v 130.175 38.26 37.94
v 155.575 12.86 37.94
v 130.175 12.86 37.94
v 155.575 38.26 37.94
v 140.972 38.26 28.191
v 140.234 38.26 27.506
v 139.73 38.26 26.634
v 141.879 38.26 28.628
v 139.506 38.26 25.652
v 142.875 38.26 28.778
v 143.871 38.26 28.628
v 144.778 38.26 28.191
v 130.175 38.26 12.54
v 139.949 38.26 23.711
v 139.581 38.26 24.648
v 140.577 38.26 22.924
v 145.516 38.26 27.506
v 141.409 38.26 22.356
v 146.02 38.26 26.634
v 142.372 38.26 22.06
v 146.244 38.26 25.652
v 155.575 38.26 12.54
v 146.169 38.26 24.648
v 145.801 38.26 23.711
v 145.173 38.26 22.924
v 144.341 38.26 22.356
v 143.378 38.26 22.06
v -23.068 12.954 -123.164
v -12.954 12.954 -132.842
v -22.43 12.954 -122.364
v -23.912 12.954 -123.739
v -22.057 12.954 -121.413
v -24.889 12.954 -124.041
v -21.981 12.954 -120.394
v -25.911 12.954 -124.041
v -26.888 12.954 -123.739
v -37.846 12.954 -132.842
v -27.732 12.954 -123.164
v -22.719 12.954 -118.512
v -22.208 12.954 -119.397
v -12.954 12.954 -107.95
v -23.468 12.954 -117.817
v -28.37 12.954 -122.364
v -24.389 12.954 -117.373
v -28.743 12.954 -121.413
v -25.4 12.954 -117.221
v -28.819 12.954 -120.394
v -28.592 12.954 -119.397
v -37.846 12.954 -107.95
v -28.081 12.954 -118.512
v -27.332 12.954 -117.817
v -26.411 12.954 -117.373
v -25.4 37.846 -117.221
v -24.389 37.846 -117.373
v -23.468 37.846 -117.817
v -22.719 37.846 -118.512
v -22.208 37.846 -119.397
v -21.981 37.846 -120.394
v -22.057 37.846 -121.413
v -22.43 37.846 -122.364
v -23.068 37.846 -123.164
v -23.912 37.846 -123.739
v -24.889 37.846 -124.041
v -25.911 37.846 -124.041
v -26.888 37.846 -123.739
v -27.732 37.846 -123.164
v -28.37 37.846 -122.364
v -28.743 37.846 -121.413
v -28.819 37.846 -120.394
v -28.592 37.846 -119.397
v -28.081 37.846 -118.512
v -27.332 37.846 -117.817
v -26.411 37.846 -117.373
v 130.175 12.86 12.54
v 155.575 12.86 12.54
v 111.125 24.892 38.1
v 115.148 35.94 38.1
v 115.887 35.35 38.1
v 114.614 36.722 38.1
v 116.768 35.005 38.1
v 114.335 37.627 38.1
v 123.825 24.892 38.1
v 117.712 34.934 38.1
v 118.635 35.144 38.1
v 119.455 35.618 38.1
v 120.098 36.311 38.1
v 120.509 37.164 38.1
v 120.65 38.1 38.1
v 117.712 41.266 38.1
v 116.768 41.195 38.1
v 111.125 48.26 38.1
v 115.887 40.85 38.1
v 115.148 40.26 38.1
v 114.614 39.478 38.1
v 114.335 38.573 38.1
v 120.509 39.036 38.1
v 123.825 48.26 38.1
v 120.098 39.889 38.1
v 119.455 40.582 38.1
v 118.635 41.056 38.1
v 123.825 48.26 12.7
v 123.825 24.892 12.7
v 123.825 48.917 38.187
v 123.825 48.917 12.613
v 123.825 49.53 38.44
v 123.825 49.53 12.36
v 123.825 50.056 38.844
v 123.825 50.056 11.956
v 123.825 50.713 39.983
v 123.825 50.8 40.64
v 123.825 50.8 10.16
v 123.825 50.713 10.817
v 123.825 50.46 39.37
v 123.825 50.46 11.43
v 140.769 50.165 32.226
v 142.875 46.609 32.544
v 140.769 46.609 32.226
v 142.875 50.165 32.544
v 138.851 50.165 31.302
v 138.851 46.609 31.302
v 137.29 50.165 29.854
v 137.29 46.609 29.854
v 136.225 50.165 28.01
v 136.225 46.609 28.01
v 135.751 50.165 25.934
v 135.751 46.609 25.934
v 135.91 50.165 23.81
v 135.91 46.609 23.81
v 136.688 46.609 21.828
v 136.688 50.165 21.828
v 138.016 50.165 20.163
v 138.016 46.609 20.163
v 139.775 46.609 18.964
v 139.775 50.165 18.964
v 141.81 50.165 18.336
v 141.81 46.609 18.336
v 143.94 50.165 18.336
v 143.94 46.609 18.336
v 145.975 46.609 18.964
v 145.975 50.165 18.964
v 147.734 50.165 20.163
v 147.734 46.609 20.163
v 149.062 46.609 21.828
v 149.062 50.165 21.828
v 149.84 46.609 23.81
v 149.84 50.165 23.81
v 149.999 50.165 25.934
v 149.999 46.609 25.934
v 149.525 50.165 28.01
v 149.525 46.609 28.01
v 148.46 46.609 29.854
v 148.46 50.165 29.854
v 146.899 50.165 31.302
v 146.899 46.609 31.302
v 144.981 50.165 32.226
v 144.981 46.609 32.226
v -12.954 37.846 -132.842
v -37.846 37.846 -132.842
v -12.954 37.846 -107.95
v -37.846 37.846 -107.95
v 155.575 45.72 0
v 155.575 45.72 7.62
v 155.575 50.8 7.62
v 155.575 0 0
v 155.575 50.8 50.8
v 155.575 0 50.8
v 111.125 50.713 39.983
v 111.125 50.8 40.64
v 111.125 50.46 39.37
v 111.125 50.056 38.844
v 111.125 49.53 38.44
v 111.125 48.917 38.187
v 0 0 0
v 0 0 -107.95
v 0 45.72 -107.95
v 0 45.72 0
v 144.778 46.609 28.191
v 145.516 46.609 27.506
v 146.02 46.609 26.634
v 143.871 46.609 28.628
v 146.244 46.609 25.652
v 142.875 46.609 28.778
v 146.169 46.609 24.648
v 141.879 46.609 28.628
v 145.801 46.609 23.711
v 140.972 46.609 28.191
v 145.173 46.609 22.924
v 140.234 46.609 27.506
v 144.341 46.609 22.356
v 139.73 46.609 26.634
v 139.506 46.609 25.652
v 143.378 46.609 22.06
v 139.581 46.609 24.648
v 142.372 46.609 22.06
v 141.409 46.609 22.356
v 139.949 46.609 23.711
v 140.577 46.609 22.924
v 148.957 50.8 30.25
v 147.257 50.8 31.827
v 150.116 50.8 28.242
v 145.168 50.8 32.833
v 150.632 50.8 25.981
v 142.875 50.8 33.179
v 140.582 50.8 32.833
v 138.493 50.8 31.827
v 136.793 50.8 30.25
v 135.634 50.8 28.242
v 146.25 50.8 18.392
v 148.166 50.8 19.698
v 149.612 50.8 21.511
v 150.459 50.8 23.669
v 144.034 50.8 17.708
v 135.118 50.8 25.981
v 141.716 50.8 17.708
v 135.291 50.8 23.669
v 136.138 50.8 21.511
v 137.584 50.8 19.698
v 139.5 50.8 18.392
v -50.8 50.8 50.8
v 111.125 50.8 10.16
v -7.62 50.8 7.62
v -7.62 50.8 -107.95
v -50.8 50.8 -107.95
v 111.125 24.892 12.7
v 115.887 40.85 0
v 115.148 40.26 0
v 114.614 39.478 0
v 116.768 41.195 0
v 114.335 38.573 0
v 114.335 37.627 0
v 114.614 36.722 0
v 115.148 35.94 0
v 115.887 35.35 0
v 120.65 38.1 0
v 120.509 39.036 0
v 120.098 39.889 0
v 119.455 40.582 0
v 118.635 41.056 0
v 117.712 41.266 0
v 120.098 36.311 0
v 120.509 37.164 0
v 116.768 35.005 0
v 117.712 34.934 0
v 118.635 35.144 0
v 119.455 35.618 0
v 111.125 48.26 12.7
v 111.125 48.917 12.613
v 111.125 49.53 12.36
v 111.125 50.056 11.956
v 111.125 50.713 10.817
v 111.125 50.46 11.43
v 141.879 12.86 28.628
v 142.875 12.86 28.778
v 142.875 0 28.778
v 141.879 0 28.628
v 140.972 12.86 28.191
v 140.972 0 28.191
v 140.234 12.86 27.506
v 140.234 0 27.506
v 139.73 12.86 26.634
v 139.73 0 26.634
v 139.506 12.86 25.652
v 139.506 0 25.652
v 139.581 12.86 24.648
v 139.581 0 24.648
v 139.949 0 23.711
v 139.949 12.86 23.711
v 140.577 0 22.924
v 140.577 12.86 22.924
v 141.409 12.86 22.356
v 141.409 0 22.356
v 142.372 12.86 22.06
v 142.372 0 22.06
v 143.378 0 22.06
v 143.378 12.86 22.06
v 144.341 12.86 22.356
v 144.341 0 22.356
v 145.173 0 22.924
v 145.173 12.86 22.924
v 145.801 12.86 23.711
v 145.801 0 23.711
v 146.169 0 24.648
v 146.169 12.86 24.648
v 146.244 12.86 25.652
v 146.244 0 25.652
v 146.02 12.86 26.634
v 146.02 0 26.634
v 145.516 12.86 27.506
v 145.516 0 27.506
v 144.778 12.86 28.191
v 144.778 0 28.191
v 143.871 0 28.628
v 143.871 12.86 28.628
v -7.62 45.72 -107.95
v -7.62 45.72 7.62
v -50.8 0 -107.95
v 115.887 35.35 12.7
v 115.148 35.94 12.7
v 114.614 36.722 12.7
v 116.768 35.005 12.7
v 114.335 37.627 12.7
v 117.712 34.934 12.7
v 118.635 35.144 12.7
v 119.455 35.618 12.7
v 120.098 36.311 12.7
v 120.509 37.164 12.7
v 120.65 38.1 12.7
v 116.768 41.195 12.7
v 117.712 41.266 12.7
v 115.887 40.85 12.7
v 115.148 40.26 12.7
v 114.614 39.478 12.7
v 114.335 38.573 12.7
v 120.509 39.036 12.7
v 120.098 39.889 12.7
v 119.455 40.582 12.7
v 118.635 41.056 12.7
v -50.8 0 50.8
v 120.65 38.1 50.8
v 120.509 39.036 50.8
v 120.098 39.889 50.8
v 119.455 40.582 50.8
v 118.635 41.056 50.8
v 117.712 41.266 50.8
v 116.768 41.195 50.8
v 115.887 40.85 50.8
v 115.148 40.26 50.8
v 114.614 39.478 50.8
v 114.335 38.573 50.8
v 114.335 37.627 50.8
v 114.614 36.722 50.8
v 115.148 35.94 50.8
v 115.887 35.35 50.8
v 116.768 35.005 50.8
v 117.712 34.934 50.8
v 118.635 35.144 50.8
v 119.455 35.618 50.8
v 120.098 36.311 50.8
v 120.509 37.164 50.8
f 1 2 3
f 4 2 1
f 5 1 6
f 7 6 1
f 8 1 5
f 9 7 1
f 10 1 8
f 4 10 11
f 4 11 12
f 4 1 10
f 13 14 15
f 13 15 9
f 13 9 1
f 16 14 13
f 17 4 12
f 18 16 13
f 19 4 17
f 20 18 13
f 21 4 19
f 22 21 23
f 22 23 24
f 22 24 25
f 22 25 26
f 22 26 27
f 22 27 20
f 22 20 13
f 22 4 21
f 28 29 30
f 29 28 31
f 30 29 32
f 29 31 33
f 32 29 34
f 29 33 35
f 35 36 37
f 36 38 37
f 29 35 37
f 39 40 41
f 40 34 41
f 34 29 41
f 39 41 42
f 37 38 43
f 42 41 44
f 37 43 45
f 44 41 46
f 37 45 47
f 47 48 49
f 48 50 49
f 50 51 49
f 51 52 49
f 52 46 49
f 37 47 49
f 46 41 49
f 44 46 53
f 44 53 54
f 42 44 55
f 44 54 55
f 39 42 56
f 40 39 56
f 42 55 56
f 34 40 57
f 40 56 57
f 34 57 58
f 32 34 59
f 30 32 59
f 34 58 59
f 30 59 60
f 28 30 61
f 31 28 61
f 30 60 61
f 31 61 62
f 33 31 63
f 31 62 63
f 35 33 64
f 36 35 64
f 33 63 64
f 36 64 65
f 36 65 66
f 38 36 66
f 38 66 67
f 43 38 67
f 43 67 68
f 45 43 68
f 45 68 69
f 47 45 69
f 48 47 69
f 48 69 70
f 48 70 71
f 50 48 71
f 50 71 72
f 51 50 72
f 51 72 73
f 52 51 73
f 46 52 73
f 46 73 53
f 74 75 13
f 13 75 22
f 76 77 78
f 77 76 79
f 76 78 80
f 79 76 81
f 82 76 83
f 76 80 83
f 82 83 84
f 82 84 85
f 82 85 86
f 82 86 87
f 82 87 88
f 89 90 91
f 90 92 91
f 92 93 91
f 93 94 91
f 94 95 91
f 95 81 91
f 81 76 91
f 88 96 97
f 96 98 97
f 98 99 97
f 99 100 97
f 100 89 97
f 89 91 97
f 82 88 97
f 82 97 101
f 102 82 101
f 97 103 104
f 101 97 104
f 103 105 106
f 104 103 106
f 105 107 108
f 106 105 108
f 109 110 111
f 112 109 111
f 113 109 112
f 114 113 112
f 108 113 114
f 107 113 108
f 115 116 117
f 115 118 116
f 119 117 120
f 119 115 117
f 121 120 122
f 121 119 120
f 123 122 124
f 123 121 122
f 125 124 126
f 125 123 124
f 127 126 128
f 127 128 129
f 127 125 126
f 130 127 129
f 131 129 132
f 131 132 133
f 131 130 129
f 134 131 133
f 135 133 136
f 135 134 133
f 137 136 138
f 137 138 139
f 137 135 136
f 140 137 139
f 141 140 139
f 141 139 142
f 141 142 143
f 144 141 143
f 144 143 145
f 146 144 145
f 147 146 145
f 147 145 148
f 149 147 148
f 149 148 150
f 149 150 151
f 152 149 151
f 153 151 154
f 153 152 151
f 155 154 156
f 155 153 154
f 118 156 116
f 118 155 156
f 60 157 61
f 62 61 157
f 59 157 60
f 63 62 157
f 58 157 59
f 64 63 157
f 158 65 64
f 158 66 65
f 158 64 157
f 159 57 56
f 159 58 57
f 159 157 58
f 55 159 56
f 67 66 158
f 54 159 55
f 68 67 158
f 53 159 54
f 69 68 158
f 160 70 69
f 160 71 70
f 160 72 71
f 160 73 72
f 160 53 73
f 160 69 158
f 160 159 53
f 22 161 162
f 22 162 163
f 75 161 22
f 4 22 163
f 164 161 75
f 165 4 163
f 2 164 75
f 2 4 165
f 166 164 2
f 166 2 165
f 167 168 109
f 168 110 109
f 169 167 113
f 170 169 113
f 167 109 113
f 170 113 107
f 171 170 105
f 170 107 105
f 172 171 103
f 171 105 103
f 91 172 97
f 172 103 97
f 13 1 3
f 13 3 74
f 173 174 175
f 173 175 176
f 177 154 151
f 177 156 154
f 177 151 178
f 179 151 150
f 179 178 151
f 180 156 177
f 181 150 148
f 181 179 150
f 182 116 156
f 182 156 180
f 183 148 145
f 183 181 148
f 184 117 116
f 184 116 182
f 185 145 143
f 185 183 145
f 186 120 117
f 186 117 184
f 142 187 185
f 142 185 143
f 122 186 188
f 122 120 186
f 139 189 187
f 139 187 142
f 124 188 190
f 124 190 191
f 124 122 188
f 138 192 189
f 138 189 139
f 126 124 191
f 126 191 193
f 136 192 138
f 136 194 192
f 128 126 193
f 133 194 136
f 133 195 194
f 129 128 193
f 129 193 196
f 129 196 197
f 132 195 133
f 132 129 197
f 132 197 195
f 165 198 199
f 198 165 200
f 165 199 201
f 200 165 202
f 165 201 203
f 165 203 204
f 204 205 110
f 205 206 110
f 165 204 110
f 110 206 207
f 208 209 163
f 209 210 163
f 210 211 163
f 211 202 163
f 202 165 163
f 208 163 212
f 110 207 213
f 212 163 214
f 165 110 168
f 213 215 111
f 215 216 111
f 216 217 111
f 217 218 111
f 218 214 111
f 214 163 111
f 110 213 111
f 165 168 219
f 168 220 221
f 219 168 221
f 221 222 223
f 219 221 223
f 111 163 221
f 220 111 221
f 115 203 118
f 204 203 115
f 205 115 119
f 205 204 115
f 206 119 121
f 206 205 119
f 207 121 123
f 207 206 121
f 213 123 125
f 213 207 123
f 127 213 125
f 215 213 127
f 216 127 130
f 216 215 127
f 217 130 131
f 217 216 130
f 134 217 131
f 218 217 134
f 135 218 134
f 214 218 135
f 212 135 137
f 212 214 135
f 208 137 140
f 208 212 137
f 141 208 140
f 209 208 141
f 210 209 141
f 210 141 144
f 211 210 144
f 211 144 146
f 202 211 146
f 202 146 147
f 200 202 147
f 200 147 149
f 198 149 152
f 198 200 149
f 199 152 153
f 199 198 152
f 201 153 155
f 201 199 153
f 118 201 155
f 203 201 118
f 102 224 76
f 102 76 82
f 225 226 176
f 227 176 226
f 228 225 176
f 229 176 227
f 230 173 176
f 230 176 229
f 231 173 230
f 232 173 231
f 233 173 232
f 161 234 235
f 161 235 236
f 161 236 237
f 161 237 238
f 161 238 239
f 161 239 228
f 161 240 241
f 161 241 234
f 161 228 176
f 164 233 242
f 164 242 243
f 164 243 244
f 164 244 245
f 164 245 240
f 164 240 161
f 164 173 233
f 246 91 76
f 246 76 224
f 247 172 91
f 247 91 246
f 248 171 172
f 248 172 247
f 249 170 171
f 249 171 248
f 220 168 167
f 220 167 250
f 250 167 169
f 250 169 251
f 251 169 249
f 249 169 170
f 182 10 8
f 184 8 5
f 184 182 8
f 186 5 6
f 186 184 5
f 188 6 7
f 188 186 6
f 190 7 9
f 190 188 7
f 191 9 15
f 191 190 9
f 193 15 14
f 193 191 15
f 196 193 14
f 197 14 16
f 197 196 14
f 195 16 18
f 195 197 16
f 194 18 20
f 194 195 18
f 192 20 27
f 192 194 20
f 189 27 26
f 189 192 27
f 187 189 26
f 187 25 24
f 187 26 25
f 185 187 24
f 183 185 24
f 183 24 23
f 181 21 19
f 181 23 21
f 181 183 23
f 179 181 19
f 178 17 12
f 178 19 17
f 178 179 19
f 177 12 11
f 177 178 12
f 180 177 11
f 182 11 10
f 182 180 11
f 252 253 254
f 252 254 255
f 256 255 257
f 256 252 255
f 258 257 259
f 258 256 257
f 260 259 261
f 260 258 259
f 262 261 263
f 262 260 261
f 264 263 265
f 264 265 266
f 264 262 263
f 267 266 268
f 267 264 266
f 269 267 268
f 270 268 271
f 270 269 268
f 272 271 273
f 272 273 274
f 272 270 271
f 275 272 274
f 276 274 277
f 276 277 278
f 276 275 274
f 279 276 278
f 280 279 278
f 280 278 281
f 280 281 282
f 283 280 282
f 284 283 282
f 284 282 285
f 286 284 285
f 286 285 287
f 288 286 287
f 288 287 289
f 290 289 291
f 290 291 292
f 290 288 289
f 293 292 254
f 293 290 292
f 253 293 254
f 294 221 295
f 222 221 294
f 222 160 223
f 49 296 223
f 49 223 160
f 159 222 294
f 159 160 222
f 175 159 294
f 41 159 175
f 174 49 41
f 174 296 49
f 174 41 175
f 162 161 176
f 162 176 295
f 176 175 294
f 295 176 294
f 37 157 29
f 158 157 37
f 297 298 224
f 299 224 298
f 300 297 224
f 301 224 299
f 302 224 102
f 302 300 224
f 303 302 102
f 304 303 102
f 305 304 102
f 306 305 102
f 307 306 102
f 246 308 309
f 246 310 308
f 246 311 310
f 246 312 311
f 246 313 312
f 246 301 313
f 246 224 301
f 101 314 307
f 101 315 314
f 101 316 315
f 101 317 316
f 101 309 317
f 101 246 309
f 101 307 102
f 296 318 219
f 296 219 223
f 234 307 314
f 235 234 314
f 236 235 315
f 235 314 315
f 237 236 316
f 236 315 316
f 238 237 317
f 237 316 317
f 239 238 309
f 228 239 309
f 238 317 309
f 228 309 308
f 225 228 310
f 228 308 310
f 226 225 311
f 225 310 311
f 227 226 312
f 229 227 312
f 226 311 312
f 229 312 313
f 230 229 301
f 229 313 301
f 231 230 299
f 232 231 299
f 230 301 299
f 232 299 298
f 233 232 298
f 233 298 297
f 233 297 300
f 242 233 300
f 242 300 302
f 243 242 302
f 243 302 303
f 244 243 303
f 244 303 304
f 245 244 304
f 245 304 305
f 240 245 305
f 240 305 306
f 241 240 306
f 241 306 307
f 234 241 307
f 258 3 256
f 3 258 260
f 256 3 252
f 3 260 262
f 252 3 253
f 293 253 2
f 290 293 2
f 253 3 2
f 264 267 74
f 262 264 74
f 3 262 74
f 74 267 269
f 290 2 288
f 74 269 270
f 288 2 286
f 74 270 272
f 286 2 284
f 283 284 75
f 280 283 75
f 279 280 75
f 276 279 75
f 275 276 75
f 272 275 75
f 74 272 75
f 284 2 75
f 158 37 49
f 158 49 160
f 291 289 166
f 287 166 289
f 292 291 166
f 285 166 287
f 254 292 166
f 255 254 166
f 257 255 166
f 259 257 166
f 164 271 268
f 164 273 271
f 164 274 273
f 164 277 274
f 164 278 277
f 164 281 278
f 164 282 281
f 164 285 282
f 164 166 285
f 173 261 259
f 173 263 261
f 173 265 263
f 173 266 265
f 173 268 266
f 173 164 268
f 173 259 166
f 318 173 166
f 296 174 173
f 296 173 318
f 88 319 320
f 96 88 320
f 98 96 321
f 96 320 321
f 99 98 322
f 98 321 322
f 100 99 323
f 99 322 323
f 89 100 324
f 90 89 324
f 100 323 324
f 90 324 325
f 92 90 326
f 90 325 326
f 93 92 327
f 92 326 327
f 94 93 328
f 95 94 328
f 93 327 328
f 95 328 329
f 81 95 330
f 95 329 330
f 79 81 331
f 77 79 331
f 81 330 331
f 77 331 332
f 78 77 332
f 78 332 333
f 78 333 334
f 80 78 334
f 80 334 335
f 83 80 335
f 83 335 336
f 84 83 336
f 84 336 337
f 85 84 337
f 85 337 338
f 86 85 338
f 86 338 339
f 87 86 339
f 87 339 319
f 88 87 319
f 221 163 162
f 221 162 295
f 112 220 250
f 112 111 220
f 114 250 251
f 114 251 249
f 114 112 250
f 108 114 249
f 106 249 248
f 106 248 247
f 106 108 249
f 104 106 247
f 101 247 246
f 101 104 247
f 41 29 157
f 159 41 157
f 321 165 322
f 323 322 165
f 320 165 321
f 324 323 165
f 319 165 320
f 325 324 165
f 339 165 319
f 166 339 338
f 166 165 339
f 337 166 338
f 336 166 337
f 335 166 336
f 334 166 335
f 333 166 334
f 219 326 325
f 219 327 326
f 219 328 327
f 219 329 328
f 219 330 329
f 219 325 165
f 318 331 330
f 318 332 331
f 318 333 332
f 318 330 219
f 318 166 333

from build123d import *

# Parameters (mm, degrees)
BOSS_EXTRUDE1_DEPTH = 50.8
SKETCH3_W           = 25.4
SKETCH3_H           = 25.4
CUT_EXTRUDE1_DEPTH  = 25.4
SKETCH8_W           = 24.892
SKETCH8_H           = 24.892
BOSS_EXTRUDE2_DEPTH = 24.892
SKETCH12_R          = 3.429
CUT_EXTRUDE2_DEPTH  = 25.4
SKETCH13_W          = 12.7
SKETCH13_H          = 25.4
CUT_EXTRUDE3_DEPTH  = 25.908
FILLET1_R           = 2.54
CUT_EXTRUDE6_DEPTH  = 5.08
SKETCH15_R          = 3.175
CUT_EXTRUDE7_DEPTH  = 246.984968624


with BuildPart() as part:
    # Sketch2 → Boss-Extrude1 (new body)
    with BuildSketch(Plane(origin=(0, 0, 0), x_dir=(1, 0, 0), z_dir=(0, 1, 0))):
        Polygon((-50.8, 107.95), (0, 107.95), (0, 0), (155.575, 0), (155.575, -50.8), (-50.8, -50.8), align=None)
    extrude(amount=BOSS_EXTRUDE1_DEPTH)

    # Sketch3 → Cut-Extrude1 (cut)
    with BuildSketch(Plane(origin=(155.575, 0, 0), x_dir=(0, 0, -1), z_dir=(1, 0, 0))):
        with Locations((-25.239912, 25.560088)):
            Rectangle(SKETCH3_W, SKETCH3_H)
    extrude(amount=-CUT_EXTRUDE1_DEPTH, mode=Mode.SUBTRACT)

    # Sketch7 → CBORE for 1/4 Binding Head Machine Screw1 (revolve, cut)
    with BuildSketch(Plane(origin=(142.875, 50.8, 25.4), x_dir=(0, 0, 1), z_dir=(1, 0, 0))):
        Polygon((0, 0), (0, 50.8), (3.3782, 50.8), (3.3782, 4.191), (7.14375, 4.191), (7.14375, 0.635), (7.77875, 0), align=None)
    revolve(axis=Axis((142.875, 57.15, 25.4), (0, -1, 0)), mode=Mode.SUBTRACT)

    # Sketch8 → Boss-Extrude2 (add)
    with BuildSketch(Plane(origin=(0, 0, -107.95), x_dir=(-1, 0, 0), z_dir=(0, 0, -1))):
        with Locations((25.4, 25.4)):
            Rectangle(SKETCH8_W, SKETCH8_H)
    extrude(amount=BOSS_EXTRUDE2_DEPTH)

    # Sketch12 → Cut-Extrude2 (cut)
    with BuildSketch(Plane(origin=(0, 37.846, 0), x_dir=(1, 0, 0), z_dir=(0, 1, 0))):
        with Locations(Location((-25.4, 120.65, 0), (0, 0, 270))):
            Circle(SKETCH12_R)
    extrude(amount=-CUT_EXTRUDE2_DEPTH, mode=Mode.SUBTRACT)

    # Sketch13 → Cut-Extrude3 (cut)
    with BuildSketch(Plane(origin=(0, 50.8, 0), x_dir=(1, 0, 0), z_dir=(0, 1, 0))):
        with Locations((117.475, -25.4)):
            Rectangle(SKETCH13_W, SKETCH13_H)
    extrude(amount=-CUT_EXTRUDE3_DEPTH, mode=Mode.SUBTRACT)

    # Fillet1
    fillet1_edges = [part.edges().sort_by_distance(p)[0] for p in [
        (117.475, 50.8, 12.7),
        (117.475, 50.8, 38.1),
    ]]
    fillet(fillet1_edges, radius=FILLET1_R)

    # Sketch17 → Cut-Extrude6 (cut)
    with BuildSketch(Plane(origin=(0, 50.8, 0), x_dir=(1, 0, 0), z_dir=(0, 1, 0))):
        Polygon((0, 107.95), (0, 0), (155.575, 0), (155.575, -7.62), (-7.62, -7.62), (-7.62, 107.95), align=None)
    extrude(amount=-CUT_EXTRUDE6_DEPTH, mode=Mode.SUBTRACT)

    # Sketch15 → Cut-Extrude7 (cut, through all)
    with BuildSketch(Plane.XY.offset(50.8)):
        with Locations((117.475, 38.1)):
            Circle(SKETCH15_R)
    extrude(amount=-CUT_EXTRUDE7_DEPTH, mode=Mode.SUBTRACT)


solid = part.part
